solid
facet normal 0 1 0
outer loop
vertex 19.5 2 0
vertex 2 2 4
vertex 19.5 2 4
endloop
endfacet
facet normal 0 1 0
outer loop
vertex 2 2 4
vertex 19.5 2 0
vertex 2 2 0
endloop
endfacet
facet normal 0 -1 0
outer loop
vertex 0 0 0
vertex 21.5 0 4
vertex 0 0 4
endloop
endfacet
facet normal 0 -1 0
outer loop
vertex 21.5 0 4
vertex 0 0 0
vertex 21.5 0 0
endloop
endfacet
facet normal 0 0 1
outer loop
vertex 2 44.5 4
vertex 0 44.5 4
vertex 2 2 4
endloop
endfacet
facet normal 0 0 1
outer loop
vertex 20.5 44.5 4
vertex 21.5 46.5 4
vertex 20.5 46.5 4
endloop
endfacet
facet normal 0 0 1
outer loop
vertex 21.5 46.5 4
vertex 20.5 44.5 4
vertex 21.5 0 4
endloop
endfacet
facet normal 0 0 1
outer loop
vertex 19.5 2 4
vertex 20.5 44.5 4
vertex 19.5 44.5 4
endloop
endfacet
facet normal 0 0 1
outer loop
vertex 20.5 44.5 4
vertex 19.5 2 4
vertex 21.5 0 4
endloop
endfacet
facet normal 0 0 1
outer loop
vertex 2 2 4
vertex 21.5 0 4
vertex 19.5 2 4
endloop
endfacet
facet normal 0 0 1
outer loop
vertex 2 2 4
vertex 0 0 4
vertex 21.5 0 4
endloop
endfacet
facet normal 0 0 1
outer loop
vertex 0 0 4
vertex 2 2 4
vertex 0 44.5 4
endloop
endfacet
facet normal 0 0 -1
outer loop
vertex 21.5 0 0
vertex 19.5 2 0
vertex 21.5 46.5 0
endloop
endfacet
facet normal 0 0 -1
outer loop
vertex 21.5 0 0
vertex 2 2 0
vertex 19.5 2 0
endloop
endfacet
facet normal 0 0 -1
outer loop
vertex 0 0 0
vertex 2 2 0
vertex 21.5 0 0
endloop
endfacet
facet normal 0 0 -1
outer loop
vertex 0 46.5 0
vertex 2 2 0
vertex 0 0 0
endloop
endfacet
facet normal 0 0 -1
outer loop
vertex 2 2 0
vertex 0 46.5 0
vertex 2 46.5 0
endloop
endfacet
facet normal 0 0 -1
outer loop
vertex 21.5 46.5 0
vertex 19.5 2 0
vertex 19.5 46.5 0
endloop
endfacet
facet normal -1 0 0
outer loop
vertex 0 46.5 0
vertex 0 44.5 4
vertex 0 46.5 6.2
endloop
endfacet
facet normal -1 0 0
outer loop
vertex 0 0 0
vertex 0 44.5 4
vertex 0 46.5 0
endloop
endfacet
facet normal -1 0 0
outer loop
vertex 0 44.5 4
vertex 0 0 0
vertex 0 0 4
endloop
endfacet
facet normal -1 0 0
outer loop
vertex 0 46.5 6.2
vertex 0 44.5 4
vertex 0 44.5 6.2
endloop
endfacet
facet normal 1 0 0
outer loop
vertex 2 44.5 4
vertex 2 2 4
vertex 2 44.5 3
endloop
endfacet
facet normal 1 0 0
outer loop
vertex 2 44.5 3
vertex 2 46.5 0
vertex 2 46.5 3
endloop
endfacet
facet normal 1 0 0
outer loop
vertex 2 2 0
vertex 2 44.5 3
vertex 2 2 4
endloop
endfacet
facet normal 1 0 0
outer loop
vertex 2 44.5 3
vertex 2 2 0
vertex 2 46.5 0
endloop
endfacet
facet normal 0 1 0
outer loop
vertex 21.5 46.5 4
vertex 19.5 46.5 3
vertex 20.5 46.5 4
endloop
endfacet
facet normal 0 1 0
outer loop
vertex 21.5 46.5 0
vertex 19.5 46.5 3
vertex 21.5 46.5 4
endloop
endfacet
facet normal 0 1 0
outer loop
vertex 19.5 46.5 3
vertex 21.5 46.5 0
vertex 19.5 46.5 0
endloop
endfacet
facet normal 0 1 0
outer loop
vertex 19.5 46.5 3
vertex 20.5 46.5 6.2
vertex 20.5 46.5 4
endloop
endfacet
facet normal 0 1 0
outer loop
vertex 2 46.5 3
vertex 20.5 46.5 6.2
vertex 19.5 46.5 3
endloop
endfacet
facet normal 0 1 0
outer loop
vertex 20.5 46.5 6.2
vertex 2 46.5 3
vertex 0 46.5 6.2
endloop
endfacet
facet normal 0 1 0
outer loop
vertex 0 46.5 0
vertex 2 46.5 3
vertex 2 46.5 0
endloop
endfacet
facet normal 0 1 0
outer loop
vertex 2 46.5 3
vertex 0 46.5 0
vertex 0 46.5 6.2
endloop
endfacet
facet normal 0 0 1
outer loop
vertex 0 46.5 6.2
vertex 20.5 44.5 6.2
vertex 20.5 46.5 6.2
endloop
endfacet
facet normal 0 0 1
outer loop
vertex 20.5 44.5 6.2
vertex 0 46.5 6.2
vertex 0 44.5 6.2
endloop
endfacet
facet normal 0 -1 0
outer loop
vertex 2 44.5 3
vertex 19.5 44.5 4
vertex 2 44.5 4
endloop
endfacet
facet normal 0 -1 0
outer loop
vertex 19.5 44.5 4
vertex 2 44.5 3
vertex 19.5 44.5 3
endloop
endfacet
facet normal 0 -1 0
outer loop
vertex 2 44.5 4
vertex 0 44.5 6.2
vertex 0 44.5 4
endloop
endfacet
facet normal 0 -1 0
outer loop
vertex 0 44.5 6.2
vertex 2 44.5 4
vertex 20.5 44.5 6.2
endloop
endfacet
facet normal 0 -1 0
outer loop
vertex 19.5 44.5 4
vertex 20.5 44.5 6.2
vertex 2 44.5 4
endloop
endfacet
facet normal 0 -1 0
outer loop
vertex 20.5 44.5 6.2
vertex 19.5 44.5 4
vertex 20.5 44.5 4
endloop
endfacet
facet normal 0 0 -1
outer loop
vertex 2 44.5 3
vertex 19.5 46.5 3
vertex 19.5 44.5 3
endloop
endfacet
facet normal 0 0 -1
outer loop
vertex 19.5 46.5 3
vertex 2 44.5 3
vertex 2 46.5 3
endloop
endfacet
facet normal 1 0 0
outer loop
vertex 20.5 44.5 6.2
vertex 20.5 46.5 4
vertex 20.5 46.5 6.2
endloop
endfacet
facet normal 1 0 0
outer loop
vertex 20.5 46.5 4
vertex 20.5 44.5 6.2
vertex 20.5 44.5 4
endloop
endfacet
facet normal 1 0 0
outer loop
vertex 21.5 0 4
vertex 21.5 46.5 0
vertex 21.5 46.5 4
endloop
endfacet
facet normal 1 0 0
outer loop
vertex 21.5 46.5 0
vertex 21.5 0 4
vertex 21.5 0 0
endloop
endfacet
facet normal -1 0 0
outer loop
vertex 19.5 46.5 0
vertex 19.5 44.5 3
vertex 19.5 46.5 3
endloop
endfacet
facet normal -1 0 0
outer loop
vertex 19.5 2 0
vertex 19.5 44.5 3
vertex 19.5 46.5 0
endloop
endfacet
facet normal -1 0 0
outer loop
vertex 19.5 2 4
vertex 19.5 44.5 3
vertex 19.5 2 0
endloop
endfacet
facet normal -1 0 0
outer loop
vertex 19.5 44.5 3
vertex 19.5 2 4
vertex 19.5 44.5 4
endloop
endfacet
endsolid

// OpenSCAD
// file: ../base/cube_stacker_base.scad
//Includes 
use <../base/cube_base.scad>

//Model information
model_length = 10;
model_depth = 10;
model_height = 10;
model_offset = 0;
box_height = 1;
model_opening = 0;
model_slack = 10;
stacker_height = 100;
stacker_wall_thickness = 10;

/*
translate([model_offset, model_offset, 0]){
	box(model_length, model_depth, model_height, 1);
}
*/

module stacker(model_length, model_depth, model_height, model_opening, stacker_height, stacker_wall_thickness, box_height, model_slack){
	//Calculated
	wall_length_calc = model_length * model_slack;
	model_depth_calc = model_depth * model_slack;
	model_height_calc = model_height * model_slack;

	//Wall 
	wall_length = [wall_length_calc, stacker_wall_thickness, wall_length_calc, stacker_wall_thickness];
	wall_depth = [stacker_wall_thickness, model_depth_calc, stacker_wall_thickness, model_depth_calc];
	wall_height = [stacker_height, stacker_height, stacker_height -model_opening, stacker_height];
	wall_box_height = [box_height, box_height, box_height, box_height];
	wall_offset = [
	[0, 0, 0],
	[0, 0, 0],
	[0, model_depth_calc - stacker_wall_thickness, model_opening],
	[wall_length_calc, 0, 0]
	];

	wall = [
	wall_length,
	wall_depth,
	wall_height,
	wall_box_height,
	wall_offset
	];

	for(segment = [0:3]){
		translate(wall[4][segment]){
			box(wall[0][segment], wall[1][segment], wall[2][segment], wall[3][segment]);
		}
	}
}
stacker(model_length, model_depth, model_height, model_opening, stacker_height, stacker_wall_thickness, box_height, model_slack);
// file: ../base/cube_base.scad
input_length = 10;
input_height = 10;
input_depth = 10;
box_size = 1;

module box(input_length, input_depth, input_height, box_size){
	length = input_length;
	height = input_height - box_size;
	depth = input_depth;

	bottom_back_left =   [0,      0,     0];
	top_back_left =      [0,      0,     height];
	bottom_front_left =  [0,      depth, 0];
	top_front_left =     [0,      depth, height];
	bottom_back_right =  [length, 0,     0];
	top_back_right =     [length, 0,     height];
	bottom_front_right = [length, depth, 0];
	top_front_right =    [length, depth, height];

	box = [bottom_back_left, top_back_left, bottom_front_left, top_front_left, bottom_back_right, top_back_right, bottom_front_right, top_front_right];

	hull(){
		for(position = box){
			translate(position){
				cube(box_size);
			}
		}
	}
}

box(input_length, input_depth, input_height, box_size);
// main file
//Includes 
use <../base/cube_base.scad>
use <../base/cube_stacker_base.scad>

//Model information
model_length = 15;
model_depth = 35;
model_height = 4;
model_offset = 3;
model_opening = model_height * 1.3;
box_height = 1;
model_slack = 1.3;
number_of_models = 1;
stacker_height = model_height * number_of_models;
stacker_wall_thickness = 1;

/*
translate([model_offset, model_offset, 0]){
	color("red"){
		box(model_length, model_depth, model_height, 1);
	}
}
*/

stacker(model_length, model_depth, model_height, model_opening, stacker_height, stacker_wall_thickness, box_height, model_slack);
